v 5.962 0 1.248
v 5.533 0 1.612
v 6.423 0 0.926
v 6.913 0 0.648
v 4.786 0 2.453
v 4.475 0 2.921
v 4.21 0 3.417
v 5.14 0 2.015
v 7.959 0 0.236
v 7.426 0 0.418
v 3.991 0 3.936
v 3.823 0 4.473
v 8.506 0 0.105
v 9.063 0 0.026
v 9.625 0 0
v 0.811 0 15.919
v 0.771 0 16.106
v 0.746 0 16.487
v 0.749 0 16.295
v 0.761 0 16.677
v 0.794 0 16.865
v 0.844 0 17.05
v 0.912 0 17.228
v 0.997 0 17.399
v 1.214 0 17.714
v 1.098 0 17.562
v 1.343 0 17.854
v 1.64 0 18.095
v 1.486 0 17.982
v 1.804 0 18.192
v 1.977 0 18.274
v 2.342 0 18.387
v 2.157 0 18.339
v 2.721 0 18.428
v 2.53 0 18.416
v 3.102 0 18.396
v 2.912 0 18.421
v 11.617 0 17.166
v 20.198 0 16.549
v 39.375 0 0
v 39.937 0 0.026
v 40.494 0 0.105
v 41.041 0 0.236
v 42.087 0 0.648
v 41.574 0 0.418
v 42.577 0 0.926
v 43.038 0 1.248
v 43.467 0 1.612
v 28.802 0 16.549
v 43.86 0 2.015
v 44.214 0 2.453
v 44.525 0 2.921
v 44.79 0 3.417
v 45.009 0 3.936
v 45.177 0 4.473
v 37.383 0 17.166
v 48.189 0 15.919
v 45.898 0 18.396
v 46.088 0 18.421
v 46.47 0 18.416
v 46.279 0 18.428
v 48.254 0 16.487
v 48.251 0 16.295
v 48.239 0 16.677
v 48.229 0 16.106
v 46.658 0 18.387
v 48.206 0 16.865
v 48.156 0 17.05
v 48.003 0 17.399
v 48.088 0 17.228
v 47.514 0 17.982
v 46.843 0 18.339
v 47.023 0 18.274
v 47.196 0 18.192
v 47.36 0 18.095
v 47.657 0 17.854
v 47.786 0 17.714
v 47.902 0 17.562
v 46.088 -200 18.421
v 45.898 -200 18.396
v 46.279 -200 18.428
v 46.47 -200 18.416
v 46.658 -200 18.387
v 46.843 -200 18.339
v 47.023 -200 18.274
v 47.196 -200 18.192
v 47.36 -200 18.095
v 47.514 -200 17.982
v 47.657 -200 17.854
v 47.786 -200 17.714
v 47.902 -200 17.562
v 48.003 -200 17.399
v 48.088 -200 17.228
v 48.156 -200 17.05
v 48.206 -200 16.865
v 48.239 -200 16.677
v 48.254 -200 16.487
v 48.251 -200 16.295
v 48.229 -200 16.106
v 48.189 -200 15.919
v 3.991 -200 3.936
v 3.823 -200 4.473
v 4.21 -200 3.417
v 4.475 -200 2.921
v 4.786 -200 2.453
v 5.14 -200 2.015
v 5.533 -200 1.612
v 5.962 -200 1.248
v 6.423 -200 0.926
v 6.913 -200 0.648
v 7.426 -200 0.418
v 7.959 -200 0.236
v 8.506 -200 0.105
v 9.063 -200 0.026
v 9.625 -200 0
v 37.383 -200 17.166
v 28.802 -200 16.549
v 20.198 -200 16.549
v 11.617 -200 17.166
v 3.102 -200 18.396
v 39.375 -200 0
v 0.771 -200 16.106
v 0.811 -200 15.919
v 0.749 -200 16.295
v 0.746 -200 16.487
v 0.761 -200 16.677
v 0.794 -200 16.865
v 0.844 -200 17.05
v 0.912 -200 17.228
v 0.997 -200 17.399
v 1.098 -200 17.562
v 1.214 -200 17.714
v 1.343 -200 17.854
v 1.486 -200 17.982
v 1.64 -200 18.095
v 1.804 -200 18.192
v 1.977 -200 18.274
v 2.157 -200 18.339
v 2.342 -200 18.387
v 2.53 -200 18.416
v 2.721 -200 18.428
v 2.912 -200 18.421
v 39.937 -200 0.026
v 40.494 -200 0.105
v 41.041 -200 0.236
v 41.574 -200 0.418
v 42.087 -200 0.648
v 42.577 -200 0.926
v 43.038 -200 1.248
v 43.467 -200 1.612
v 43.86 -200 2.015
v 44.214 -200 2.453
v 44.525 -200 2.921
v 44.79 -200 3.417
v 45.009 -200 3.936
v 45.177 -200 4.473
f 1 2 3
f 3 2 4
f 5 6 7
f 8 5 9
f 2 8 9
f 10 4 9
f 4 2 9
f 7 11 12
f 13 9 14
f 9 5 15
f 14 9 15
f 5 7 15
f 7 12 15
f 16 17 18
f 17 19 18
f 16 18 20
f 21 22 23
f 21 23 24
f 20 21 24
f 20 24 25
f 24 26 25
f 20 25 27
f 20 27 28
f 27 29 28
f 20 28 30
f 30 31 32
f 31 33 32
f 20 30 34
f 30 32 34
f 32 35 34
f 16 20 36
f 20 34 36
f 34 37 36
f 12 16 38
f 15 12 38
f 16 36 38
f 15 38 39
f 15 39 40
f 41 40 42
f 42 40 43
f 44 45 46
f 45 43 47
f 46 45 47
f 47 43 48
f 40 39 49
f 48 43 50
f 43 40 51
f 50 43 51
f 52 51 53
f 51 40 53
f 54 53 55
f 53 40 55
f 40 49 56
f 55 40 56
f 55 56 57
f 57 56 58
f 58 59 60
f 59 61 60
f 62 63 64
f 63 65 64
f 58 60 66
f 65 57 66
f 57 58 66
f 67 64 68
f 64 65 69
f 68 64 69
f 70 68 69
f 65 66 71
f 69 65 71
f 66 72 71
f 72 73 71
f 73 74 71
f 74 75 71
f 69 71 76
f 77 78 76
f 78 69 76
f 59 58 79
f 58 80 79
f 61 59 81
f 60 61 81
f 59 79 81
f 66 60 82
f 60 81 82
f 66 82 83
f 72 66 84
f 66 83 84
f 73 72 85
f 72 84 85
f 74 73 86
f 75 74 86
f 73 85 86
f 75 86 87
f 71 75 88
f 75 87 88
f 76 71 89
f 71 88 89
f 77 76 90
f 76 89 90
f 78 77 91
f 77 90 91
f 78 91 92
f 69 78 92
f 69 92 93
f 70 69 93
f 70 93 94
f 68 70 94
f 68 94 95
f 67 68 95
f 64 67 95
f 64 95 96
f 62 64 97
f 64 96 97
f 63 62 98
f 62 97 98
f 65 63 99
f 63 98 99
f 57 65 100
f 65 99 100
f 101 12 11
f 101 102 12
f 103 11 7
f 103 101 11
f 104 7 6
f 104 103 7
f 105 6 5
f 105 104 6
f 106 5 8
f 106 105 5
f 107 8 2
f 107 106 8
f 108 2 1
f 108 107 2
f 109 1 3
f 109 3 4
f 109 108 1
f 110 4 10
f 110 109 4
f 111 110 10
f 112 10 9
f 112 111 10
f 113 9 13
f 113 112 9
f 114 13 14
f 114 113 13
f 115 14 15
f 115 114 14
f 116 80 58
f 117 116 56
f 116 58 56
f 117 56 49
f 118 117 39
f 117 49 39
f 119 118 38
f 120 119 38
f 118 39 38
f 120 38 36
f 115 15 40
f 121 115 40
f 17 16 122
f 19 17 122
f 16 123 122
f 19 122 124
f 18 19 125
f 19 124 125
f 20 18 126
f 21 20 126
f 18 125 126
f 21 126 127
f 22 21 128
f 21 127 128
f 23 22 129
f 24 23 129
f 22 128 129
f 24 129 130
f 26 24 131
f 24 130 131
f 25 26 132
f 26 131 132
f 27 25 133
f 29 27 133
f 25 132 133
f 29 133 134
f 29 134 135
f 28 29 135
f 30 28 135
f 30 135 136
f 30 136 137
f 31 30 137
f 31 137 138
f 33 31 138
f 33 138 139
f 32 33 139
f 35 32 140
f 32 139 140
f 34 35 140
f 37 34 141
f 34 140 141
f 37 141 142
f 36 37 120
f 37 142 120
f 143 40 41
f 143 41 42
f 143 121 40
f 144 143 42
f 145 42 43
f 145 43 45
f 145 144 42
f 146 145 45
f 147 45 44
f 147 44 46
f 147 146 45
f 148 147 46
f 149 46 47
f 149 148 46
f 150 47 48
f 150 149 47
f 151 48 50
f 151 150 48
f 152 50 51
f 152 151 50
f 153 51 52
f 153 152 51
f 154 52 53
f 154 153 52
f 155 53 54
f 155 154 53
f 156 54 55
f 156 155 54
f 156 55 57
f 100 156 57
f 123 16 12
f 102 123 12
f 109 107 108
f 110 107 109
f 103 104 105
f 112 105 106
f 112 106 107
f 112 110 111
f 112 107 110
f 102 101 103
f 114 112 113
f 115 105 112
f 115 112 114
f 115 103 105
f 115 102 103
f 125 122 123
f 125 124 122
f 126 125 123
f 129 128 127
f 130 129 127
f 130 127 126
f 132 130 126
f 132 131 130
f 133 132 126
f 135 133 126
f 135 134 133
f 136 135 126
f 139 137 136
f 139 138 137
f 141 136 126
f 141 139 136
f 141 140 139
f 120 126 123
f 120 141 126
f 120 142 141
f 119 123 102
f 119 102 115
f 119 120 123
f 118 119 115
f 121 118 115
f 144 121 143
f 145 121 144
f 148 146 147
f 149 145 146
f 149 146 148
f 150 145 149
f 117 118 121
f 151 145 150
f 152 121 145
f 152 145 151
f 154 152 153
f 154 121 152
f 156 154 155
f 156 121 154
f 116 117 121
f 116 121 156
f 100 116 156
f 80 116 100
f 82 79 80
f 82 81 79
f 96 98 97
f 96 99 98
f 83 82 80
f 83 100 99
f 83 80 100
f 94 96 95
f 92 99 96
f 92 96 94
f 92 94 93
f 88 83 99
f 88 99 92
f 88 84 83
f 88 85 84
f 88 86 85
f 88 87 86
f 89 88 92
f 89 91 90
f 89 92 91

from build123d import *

# Parameters (mm, degrees)
F1_DEPTH = 200
F2_R     = 6
F3_R     = 2


with BuildPart() as f1:
    # F0 (on Front) → F1 (new body)
    with BuildSketch(Plane.XZ):
        with BuildLine():
            Line((0, 19), (5, 0))
            Line((5, 0), (44, 0))
            Line((44, 0), (49, 19))
            ThreePointArc((49, 19), (24.5, 16.472337), (0, 19))
        make_face()
    extrude(amount=F1_DEPTH)

    # F2
    f2_edges = [f1.edges().sort_by_distance(p)[0] for p in [
        (5, -100, 0),
        (44, -100, 0),
    ]]
    fillet(f2_edges, radius=F2_R)

    # F3
    f3_edges = [f1.edges().sort_by_distance(p)[0] for p in [
        (49, -100, 19),
        (0, -100, 19),
    ]]
    fillet(f3_edges, radius=F3_R)


solid = f1.part
